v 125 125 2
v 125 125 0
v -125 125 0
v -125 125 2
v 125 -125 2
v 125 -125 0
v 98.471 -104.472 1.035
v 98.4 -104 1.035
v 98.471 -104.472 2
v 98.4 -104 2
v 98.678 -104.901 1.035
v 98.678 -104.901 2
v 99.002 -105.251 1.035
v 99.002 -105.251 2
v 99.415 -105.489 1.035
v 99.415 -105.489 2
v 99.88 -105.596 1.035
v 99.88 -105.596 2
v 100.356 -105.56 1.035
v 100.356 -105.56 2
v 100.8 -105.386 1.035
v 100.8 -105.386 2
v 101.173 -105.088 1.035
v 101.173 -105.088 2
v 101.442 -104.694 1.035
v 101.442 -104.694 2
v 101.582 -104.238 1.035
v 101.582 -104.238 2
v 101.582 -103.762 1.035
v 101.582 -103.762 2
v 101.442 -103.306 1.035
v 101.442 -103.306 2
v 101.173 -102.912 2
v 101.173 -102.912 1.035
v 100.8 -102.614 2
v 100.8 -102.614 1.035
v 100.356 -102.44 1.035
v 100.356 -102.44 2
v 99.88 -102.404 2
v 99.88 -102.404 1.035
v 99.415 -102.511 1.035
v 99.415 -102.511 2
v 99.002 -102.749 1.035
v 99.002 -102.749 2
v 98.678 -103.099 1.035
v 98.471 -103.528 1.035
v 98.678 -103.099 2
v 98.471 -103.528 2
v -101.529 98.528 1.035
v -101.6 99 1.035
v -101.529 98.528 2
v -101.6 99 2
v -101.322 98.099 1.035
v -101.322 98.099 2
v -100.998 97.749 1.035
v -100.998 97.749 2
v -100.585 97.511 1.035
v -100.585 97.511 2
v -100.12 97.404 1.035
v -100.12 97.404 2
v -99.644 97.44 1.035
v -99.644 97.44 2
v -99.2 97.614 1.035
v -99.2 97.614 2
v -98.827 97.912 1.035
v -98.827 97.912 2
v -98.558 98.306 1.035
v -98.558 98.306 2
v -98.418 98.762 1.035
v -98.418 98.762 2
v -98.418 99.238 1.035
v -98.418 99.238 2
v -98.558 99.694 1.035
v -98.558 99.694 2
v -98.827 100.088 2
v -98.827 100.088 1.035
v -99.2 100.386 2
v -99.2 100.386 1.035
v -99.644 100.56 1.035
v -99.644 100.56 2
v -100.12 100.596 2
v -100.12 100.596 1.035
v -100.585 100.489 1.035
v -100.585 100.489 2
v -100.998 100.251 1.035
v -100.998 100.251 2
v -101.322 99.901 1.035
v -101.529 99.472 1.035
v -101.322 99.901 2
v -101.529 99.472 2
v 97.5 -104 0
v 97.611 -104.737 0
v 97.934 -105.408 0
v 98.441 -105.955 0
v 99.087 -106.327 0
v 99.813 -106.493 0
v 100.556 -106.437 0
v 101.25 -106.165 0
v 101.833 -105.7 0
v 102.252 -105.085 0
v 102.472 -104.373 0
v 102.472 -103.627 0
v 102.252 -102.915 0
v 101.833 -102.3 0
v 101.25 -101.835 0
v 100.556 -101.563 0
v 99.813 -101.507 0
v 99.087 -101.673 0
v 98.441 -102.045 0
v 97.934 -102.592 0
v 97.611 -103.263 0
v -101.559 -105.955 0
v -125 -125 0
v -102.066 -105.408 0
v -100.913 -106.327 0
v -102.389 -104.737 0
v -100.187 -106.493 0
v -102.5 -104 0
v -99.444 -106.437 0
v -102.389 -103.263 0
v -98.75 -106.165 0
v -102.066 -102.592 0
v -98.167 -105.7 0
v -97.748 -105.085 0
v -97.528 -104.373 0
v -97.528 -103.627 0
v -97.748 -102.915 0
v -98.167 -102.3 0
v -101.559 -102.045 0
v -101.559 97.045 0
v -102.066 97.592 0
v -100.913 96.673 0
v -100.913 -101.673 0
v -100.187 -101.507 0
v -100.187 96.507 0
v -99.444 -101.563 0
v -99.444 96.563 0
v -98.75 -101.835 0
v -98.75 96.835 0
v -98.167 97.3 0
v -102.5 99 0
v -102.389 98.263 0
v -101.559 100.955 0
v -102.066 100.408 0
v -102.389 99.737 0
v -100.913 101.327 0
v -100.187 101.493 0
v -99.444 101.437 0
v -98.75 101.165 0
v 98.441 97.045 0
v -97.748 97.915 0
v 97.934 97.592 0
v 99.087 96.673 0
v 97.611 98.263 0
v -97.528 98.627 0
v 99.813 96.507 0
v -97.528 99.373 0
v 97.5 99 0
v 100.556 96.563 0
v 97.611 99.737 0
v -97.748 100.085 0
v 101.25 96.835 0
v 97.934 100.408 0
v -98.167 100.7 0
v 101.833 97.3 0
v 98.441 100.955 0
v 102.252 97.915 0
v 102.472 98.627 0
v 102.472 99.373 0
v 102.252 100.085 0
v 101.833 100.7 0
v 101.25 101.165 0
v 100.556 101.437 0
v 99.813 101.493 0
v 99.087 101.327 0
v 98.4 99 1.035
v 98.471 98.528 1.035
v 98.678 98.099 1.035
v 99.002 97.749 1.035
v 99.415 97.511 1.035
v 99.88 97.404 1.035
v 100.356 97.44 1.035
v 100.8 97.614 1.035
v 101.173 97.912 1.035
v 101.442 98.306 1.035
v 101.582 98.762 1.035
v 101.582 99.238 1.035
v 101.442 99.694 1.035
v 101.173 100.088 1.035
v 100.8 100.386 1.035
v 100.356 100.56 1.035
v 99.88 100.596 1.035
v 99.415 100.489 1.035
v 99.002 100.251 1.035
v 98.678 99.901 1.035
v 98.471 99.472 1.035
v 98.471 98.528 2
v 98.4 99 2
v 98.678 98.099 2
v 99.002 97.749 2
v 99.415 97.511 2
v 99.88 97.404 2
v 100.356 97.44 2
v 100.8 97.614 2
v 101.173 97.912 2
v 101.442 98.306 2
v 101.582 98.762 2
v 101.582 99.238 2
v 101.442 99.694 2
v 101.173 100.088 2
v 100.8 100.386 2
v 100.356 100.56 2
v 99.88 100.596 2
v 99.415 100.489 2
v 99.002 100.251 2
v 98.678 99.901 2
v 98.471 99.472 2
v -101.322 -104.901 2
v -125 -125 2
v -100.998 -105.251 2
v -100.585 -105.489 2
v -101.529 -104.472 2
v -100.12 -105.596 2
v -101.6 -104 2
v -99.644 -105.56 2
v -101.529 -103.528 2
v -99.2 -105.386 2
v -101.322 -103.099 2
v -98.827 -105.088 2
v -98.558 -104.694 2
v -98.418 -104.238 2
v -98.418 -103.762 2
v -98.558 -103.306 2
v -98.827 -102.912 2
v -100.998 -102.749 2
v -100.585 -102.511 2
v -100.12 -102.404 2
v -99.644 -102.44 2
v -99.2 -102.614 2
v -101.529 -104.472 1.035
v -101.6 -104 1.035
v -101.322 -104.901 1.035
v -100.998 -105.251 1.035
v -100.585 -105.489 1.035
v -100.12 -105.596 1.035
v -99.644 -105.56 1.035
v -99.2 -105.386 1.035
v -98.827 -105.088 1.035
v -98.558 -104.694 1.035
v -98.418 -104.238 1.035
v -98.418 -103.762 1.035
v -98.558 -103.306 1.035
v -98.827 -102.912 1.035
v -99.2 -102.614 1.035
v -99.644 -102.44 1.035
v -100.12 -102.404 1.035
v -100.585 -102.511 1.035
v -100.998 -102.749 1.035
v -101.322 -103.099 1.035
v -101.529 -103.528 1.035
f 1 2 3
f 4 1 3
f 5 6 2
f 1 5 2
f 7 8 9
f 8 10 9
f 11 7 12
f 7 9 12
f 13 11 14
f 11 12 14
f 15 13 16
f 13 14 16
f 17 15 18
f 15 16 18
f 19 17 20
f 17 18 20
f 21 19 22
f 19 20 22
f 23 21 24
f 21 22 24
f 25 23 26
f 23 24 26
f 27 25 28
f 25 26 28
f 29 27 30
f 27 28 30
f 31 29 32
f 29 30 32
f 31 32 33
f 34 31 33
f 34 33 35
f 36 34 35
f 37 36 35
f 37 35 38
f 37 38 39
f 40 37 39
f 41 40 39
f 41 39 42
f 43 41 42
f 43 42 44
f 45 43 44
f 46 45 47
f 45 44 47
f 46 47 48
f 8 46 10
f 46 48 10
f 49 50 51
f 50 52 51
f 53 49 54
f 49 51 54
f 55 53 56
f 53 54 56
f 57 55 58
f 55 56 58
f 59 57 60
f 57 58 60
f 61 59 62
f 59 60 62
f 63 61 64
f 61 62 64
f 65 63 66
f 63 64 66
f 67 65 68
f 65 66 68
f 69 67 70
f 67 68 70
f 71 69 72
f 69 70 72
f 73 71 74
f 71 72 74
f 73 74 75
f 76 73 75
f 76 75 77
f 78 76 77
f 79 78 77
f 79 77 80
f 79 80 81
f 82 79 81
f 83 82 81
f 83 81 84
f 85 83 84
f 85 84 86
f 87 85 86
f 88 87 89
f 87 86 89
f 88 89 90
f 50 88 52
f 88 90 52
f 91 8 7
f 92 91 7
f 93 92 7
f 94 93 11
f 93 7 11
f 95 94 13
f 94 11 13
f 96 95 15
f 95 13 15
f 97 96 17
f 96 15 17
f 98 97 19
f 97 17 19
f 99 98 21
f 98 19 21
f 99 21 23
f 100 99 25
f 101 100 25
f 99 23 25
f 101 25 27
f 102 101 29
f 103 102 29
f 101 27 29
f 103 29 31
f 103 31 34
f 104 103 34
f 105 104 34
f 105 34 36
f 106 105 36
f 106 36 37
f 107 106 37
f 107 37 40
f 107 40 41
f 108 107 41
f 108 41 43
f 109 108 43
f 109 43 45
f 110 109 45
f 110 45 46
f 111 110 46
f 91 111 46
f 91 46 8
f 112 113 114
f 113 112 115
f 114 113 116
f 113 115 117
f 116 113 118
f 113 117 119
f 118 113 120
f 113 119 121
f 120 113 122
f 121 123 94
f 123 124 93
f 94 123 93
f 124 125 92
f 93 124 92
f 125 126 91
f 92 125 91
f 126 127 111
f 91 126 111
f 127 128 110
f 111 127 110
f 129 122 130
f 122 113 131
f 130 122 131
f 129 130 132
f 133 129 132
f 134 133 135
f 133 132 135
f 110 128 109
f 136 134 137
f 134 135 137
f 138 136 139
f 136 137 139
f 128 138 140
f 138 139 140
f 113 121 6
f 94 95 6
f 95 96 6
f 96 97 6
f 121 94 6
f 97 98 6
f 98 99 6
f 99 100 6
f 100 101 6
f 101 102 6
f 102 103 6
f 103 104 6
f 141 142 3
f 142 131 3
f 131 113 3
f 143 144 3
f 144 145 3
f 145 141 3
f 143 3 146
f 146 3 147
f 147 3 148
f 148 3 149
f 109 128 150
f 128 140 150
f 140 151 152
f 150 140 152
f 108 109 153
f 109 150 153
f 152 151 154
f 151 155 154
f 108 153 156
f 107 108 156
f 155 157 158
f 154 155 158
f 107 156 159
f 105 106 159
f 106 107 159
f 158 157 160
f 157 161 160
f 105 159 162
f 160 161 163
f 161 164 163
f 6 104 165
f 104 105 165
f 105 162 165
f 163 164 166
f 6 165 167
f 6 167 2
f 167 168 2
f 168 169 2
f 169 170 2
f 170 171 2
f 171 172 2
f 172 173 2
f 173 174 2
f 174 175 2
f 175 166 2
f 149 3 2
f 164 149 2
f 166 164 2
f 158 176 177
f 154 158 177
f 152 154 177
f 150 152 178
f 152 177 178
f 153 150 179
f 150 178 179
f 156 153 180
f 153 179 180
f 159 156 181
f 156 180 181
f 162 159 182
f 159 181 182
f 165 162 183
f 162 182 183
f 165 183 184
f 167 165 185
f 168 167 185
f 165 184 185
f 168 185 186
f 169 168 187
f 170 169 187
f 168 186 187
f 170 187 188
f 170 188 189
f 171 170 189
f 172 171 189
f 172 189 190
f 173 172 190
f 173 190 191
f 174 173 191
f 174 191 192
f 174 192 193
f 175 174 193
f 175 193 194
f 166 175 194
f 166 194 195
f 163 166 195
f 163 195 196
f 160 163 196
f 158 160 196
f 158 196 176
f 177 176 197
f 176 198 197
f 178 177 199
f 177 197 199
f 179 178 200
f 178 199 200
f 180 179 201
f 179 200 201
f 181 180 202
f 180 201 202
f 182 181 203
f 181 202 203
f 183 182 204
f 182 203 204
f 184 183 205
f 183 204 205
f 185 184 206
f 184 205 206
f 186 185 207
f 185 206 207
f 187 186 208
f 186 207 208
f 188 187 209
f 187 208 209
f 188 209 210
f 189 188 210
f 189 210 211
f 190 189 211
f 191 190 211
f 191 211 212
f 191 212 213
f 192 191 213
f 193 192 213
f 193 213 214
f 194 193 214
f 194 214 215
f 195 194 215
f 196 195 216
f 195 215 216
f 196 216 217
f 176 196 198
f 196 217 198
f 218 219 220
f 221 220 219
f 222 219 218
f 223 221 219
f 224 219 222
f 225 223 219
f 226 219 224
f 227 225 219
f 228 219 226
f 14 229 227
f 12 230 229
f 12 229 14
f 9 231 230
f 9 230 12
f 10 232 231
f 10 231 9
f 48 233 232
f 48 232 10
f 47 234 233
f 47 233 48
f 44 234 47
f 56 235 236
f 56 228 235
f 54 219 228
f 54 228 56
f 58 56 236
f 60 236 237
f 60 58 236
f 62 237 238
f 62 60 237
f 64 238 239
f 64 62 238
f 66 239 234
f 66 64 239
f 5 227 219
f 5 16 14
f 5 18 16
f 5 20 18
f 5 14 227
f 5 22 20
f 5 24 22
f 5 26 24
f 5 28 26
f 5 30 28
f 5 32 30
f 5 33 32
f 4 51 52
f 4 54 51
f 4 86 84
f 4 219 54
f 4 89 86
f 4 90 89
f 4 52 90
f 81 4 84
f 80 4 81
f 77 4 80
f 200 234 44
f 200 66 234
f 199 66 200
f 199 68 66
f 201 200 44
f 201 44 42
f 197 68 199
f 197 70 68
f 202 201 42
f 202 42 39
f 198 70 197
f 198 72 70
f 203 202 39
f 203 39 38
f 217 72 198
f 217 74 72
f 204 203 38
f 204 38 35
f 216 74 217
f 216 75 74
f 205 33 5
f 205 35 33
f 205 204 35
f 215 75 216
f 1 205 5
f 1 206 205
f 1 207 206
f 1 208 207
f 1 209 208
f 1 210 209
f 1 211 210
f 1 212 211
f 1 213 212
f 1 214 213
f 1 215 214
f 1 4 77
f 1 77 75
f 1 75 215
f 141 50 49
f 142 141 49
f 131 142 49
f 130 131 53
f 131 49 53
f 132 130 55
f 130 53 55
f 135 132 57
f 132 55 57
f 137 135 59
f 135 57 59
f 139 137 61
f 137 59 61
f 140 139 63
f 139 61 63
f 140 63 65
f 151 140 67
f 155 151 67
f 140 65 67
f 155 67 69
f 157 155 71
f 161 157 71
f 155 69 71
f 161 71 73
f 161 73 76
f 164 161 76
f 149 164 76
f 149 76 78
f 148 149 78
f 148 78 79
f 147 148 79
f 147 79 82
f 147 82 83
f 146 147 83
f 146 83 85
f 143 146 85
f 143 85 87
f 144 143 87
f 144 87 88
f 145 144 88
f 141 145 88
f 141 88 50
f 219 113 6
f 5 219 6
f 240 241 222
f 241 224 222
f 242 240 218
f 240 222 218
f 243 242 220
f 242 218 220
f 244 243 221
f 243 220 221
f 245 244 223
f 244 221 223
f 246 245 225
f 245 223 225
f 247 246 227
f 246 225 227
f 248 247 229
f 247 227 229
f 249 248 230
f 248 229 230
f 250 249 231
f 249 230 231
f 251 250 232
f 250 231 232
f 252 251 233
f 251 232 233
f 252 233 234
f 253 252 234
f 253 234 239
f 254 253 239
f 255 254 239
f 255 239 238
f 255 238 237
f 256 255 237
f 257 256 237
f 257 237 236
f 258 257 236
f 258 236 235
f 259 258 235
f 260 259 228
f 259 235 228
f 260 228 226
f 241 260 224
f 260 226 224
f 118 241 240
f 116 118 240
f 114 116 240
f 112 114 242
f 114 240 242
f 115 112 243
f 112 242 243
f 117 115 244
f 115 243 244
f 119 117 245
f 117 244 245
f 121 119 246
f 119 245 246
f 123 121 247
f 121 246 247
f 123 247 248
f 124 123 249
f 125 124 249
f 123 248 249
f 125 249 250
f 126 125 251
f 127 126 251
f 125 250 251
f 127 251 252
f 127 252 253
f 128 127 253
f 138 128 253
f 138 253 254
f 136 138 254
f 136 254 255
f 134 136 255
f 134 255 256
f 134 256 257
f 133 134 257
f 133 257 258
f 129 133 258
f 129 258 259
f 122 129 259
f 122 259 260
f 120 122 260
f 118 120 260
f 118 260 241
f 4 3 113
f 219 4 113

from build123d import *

# Parameters (mm, degrees)
F0_W           = 25
F0_H           = 21
F1_DEPTH       = 2
F2_D           = 3.2
F2_CSINK_D     = 5
F2_CSINK_ANGLE = 82


with BuildPart() as f1:
    # F0 (on Top) → F1 (new body)
    with BuildSketch(Plane.XY):
        Polygon((-100, -125), (125, -125), (125, 125), (-125, 125), (-125, -104), (-100, -104), align=None)
        with Locations((-112.5, -114.5)):
            Rectangle(F0_W, F0_H)
    extrude(amount=F1_DEPTH)

    # F2 (through all)
    with Locations(Plane(origin=(0, 0, 0), x_dir=(1, 0, 0), z_dir=(0, 0, -1))):
        with Locations((-100, -99), (100, -99), (100, 104), (-100, 104)):
            CounterSinkHole(F2_D / 2, F2_CSINK_D / 2, counter_sink_angle=F2_CSINK_ANGLE)


solid = f1.part
